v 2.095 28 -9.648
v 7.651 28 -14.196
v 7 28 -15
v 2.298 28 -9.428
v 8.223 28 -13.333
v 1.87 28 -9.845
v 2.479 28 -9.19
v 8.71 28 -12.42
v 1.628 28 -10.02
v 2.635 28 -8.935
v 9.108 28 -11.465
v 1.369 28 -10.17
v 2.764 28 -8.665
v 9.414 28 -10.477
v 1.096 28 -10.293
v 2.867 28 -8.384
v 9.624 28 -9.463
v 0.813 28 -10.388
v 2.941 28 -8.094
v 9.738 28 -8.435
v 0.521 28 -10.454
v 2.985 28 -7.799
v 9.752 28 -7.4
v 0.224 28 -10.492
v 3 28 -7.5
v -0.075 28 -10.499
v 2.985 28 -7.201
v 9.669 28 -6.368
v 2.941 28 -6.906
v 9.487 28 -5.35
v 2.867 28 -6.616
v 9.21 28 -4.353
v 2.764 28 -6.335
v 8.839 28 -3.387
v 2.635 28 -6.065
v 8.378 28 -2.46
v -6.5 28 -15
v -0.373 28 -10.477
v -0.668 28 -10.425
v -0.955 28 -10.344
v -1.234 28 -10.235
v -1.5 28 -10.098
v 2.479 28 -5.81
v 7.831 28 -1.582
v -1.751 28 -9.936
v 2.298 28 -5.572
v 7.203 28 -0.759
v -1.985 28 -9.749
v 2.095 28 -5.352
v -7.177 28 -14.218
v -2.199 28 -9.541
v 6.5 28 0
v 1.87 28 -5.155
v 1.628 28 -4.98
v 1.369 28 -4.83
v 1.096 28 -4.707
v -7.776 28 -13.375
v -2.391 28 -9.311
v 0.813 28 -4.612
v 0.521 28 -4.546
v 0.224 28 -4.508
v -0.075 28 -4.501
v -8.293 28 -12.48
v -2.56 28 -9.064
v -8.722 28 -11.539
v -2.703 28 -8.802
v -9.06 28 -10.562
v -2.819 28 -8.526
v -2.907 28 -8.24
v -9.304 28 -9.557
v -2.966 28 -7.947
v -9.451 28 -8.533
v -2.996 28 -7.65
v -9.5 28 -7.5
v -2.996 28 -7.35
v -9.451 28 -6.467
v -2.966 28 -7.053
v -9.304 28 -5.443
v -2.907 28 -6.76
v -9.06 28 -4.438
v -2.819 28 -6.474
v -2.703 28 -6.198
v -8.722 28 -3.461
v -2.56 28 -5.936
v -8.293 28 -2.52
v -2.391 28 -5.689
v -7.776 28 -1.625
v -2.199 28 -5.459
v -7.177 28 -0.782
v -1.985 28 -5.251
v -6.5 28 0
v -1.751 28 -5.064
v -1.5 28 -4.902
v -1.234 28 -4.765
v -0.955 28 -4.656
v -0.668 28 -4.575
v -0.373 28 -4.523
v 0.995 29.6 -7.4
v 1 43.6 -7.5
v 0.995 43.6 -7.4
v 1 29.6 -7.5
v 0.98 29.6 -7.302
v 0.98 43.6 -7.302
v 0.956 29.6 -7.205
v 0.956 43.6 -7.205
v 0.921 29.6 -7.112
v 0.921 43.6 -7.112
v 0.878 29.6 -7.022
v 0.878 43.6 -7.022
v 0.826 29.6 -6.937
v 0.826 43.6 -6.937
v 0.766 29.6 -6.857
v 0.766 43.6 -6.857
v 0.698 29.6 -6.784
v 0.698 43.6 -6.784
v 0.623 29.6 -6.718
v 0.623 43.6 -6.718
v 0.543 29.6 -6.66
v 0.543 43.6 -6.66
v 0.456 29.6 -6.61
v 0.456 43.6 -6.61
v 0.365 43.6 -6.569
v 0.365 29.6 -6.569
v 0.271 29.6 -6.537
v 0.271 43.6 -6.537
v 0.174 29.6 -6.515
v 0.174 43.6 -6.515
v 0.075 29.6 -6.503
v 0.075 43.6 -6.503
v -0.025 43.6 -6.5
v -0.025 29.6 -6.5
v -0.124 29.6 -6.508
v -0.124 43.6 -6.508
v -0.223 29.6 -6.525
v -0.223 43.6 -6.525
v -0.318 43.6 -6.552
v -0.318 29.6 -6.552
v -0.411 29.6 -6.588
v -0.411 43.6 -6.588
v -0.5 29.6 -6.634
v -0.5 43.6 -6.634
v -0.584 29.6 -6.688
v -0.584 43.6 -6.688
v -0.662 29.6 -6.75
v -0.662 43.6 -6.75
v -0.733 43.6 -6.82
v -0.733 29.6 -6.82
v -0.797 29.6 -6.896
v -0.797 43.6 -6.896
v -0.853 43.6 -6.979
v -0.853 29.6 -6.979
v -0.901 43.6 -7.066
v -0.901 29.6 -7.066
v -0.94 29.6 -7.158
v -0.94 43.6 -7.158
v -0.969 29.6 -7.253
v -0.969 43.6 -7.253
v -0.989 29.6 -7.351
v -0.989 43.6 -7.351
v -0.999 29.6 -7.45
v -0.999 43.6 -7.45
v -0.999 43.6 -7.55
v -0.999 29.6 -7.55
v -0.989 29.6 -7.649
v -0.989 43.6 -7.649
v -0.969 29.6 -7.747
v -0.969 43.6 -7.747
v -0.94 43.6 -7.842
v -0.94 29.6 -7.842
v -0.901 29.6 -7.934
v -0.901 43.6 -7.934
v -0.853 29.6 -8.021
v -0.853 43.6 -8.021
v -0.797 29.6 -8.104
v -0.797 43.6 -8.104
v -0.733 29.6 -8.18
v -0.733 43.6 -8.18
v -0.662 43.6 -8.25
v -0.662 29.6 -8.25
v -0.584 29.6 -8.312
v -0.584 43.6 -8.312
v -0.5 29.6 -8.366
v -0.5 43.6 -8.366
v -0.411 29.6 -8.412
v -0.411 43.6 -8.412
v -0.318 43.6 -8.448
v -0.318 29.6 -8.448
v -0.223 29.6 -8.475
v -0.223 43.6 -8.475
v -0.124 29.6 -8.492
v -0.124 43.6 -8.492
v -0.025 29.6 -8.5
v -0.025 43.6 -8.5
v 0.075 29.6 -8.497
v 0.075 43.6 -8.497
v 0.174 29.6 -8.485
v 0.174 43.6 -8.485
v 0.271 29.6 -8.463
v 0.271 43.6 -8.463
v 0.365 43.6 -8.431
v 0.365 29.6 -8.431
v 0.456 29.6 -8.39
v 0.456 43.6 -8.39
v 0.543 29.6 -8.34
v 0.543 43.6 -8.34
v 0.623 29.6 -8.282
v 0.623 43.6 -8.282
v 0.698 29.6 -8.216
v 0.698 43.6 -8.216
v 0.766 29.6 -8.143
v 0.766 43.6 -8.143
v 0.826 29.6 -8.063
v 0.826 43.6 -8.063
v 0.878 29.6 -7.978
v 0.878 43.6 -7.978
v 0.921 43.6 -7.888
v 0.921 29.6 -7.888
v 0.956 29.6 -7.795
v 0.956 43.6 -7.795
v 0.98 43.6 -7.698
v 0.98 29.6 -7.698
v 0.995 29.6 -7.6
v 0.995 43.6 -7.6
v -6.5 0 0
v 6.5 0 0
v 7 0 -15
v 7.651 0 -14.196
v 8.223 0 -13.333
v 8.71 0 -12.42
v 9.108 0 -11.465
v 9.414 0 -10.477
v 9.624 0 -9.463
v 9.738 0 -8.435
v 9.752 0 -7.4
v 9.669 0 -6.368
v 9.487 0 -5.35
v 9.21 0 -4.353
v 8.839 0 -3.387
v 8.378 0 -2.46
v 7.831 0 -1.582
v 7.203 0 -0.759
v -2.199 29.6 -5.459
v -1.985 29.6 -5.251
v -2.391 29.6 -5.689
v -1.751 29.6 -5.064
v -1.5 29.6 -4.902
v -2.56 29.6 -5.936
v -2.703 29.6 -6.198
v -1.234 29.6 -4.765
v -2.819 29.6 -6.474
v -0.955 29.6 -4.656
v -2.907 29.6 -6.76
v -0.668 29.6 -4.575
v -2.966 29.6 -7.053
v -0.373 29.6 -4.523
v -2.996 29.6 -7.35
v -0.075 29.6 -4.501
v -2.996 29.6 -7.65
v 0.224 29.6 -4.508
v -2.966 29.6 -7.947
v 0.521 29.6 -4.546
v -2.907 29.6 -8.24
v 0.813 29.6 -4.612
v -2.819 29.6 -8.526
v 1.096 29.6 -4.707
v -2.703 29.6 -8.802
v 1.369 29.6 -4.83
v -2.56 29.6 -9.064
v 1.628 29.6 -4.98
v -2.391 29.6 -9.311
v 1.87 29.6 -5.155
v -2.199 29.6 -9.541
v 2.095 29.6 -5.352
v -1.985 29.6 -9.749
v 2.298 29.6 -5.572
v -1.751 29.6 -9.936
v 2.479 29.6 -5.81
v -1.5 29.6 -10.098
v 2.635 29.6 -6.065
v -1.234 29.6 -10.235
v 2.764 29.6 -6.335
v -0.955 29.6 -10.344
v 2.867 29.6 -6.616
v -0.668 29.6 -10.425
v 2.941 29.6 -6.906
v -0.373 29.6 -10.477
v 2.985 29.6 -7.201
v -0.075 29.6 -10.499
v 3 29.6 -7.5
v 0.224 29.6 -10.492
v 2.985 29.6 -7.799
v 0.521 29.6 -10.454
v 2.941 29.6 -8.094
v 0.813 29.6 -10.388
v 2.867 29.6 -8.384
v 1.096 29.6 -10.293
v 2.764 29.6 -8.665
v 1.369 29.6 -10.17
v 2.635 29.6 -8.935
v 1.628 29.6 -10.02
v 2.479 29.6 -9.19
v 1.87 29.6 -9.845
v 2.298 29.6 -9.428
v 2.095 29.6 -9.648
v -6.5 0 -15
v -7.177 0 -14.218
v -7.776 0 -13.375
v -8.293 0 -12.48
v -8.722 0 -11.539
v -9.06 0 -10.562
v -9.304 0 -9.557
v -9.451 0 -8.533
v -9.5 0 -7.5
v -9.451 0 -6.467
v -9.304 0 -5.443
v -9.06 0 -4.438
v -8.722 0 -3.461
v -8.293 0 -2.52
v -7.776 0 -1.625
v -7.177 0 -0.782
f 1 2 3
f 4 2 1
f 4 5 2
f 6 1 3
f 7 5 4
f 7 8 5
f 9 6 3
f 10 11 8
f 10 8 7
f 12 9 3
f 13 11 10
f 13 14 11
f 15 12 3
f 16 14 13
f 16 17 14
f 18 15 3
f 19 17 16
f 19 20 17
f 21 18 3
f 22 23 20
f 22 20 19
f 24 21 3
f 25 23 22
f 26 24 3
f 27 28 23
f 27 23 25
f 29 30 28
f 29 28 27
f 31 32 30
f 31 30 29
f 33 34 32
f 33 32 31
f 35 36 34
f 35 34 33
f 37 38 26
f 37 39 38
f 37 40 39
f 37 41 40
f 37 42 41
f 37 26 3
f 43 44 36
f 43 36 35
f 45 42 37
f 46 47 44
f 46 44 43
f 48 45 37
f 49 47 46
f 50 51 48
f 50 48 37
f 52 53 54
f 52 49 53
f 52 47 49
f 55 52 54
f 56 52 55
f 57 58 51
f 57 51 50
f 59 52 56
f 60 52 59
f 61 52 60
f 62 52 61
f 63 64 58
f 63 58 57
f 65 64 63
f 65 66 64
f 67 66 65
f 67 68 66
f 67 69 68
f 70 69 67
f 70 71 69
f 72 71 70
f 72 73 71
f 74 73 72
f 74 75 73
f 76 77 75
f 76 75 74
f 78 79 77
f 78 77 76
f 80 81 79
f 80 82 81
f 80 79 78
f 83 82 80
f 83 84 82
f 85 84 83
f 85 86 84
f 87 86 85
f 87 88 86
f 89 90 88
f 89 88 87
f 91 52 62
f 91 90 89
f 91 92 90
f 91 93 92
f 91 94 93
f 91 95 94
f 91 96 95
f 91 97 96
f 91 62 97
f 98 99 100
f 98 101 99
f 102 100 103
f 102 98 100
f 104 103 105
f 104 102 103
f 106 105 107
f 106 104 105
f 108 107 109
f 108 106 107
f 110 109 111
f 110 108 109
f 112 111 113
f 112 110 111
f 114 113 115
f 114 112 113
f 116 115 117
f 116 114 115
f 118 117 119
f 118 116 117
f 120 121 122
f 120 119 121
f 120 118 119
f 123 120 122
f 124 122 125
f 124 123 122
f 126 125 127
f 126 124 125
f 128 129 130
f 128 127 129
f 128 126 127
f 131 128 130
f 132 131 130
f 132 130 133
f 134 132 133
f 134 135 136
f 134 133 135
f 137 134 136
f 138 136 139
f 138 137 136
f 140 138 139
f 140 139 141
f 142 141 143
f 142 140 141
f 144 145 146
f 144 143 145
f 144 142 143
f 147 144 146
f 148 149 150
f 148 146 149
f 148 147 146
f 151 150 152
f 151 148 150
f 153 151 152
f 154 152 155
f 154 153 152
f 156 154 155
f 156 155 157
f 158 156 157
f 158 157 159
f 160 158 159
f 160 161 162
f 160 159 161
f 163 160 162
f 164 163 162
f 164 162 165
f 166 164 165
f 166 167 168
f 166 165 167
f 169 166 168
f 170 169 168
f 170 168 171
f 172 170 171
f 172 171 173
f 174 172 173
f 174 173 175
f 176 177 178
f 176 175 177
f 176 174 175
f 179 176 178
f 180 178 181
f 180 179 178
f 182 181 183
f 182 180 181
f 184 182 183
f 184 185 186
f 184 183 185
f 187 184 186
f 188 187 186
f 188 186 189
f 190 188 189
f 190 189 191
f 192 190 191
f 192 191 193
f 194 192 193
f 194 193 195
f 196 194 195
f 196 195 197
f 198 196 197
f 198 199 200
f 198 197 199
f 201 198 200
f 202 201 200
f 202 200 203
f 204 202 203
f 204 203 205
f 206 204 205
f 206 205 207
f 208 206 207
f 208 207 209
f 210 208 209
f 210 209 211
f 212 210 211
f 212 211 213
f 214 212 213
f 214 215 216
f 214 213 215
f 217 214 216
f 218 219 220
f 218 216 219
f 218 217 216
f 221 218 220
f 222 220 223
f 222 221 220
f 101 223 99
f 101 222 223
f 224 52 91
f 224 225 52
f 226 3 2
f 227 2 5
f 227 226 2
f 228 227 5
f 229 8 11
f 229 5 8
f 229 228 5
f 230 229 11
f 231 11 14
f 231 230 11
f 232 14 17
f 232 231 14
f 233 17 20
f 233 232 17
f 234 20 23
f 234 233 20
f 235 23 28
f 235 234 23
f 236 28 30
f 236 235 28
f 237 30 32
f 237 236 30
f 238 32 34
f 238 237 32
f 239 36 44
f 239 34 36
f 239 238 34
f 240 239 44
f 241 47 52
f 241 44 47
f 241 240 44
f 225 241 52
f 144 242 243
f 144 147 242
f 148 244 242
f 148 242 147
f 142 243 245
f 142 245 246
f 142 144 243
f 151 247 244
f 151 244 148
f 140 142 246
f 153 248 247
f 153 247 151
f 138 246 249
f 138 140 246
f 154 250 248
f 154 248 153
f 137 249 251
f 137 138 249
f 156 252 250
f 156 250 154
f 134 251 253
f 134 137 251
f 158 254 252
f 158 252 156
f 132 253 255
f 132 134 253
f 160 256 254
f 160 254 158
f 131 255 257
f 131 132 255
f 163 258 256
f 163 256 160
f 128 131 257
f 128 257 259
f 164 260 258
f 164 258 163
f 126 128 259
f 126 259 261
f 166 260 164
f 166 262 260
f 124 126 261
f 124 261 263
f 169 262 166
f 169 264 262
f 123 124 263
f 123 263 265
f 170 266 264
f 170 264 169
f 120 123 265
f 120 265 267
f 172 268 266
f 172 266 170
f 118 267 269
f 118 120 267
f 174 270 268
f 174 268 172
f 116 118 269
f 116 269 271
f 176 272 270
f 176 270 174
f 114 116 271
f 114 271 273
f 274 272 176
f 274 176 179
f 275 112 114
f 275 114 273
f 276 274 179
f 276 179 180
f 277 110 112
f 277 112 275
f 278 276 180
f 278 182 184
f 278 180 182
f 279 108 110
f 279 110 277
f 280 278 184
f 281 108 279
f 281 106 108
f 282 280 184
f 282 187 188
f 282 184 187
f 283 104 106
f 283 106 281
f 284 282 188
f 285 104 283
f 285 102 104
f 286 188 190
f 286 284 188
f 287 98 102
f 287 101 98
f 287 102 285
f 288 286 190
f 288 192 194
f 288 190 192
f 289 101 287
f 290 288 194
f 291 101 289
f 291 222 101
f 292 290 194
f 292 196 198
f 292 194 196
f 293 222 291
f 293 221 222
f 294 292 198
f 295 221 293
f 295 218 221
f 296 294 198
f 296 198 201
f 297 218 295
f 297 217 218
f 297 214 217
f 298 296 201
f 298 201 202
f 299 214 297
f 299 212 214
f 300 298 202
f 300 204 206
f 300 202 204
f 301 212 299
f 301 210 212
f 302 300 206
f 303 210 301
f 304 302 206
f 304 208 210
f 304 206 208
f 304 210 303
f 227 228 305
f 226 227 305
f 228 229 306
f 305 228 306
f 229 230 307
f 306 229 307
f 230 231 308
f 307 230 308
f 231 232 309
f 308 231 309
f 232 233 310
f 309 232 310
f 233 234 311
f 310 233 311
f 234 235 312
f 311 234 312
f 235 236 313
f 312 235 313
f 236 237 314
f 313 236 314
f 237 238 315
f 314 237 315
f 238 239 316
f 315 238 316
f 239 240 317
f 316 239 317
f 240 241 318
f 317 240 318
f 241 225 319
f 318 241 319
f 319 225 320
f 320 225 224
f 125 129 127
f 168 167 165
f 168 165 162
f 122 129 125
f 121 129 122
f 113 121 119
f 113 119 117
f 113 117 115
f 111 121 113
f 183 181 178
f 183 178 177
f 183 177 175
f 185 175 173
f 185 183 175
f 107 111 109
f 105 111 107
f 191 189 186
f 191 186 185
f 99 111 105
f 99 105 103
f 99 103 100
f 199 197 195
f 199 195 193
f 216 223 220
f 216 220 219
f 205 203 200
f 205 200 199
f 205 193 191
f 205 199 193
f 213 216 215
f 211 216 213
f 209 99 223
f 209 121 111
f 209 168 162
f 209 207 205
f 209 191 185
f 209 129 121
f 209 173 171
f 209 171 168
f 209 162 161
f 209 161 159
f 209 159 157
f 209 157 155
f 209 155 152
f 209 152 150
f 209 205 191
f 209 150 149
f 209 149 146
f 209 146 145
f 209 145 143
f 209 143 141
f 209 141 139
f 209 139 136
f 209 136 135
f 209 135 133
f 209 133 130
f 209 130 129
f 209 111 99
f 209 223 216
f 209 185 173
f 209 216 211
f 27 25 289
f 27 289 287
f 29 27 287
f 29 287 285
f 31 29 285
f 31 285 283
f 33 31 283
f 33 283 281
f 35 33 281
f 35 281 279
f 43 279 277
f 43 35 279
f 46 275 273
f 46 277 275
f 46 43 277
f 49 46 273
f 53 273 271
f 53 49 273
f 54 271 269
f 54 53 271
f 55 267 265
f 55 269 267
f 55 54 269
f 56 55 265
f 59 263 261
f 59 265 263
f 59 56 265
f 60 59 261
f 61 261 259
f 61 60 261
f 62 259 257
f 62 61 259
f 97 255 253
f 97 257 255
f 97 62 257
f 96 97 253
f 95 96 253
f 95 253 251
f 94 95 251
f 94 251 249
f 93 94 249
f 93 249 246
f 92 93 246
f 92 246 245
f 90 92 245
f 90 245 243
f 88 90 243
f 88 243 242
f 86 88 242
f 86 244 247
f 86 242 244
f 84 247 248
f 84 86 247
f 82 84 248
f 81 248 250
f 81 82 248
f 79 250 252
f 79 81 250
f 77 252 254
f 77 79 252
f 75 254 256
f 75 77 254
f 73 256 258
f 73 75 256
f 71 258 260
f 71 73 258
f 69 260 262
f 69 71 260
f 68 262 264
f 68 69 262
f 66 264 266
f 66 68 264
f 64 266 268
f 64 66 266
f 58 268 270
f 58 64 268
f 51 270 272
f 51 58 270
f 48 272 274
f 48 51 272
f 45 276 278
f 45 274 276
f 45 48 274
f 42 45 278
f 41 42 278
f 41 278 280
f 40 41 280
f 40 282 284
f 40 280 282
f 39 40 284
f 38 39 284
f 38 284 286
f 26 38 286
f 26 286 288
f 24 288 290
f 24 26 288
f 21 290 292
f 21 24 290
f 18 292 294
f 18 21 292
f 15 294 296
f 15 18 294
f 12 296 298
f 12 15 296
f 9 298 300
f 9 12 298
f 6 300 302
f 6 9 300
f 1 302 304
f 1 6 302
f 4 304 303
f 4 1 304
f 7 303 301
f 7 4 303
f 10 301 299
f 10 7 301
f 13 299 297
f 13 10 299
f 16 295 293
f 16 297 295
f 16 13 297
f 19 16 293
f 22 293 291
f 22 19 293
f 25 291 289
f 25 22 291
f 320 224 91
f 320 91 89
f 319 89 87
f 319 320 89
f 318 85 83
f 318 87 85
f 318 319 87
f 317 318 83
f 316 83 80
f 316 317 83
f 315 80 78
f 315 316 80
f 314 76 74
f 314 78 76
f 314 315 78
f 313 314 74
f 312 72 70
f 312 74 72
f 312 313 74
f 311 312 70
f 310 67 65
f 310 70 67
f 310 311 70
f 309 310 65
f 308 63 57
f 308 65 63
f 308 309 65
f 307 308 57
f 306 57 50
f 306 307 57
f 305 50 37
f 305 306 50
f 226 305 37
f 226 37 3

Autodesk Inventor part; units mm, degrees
ref_plane "YZ Plane" through (0, 0, 0) normal (1, 0, 0) x (0, 1, 0)
ref_plane "XZ Plane" through (0, 0, 0) normal (0, 1, 0) x (-1, 0, 0)
ref_plane "XY Plane" through (0, 0, 0) normal (0, 0, 1) x (1, 0, 0)
sketch "Sketch1" plane through (0, 0, 0) normal (0, 1, 0) x (-1, 0, 0)
  line L0 (0, 0) -> (-6.5, 0)
  line L1 (0, 0) -> (6.5, 0)
  line L2 (6.5, 0) -> (6.5, -15) construction
  line L3 (6.5, -15) -> (-7, -15)
  line L4 (-6.5, 0) -> (-9.5, 0) construction
  line L5 (6.5, 0) -> (9.5, 0) construction
  arc A0 (-6.5, 0) -> (-7, -15) centre (1.1167, -7.7622) ccw
  arc A1 (6.5, -15) -> (6.5, 0) centre (-1.375, -7.5) ccw
  dimension "d0" = 6.5
  dimension "d1" = 6.5
  dimension "d2" = 15
  dimension "d3" = 13.5
  dimension "d4" = 3
  dimension "d5" = 3
extrude "Extrusion1" add sketch "Sketch1" along normal blind 28
sketch "Sketch2" plane through (0, 28, 0) normal (0, 1, 0) x (1, 0, 0)
  line L0 (0, 0) -> (0, 7.5) construction
  circle A0 centre (0, 7.5) radius 3
  dimension "d8" = 7.5
  dimension "d9" = 6
extrude "Extrusion2" add sketch "Sketch2" along normal blind 1.6
sketch "Sketch3" plane through (0, 29.6, -7.5) normal (0, 1, 0) x (1, 0, 0)
  circle A0 centre (0, 0) radius 1
  point P0 (0, -7.5)
  dimension "d12" = 2
extrude "Extrusion3" add sketch "Sketch3" along normal blind 14
properties part number "FläktMotor"
